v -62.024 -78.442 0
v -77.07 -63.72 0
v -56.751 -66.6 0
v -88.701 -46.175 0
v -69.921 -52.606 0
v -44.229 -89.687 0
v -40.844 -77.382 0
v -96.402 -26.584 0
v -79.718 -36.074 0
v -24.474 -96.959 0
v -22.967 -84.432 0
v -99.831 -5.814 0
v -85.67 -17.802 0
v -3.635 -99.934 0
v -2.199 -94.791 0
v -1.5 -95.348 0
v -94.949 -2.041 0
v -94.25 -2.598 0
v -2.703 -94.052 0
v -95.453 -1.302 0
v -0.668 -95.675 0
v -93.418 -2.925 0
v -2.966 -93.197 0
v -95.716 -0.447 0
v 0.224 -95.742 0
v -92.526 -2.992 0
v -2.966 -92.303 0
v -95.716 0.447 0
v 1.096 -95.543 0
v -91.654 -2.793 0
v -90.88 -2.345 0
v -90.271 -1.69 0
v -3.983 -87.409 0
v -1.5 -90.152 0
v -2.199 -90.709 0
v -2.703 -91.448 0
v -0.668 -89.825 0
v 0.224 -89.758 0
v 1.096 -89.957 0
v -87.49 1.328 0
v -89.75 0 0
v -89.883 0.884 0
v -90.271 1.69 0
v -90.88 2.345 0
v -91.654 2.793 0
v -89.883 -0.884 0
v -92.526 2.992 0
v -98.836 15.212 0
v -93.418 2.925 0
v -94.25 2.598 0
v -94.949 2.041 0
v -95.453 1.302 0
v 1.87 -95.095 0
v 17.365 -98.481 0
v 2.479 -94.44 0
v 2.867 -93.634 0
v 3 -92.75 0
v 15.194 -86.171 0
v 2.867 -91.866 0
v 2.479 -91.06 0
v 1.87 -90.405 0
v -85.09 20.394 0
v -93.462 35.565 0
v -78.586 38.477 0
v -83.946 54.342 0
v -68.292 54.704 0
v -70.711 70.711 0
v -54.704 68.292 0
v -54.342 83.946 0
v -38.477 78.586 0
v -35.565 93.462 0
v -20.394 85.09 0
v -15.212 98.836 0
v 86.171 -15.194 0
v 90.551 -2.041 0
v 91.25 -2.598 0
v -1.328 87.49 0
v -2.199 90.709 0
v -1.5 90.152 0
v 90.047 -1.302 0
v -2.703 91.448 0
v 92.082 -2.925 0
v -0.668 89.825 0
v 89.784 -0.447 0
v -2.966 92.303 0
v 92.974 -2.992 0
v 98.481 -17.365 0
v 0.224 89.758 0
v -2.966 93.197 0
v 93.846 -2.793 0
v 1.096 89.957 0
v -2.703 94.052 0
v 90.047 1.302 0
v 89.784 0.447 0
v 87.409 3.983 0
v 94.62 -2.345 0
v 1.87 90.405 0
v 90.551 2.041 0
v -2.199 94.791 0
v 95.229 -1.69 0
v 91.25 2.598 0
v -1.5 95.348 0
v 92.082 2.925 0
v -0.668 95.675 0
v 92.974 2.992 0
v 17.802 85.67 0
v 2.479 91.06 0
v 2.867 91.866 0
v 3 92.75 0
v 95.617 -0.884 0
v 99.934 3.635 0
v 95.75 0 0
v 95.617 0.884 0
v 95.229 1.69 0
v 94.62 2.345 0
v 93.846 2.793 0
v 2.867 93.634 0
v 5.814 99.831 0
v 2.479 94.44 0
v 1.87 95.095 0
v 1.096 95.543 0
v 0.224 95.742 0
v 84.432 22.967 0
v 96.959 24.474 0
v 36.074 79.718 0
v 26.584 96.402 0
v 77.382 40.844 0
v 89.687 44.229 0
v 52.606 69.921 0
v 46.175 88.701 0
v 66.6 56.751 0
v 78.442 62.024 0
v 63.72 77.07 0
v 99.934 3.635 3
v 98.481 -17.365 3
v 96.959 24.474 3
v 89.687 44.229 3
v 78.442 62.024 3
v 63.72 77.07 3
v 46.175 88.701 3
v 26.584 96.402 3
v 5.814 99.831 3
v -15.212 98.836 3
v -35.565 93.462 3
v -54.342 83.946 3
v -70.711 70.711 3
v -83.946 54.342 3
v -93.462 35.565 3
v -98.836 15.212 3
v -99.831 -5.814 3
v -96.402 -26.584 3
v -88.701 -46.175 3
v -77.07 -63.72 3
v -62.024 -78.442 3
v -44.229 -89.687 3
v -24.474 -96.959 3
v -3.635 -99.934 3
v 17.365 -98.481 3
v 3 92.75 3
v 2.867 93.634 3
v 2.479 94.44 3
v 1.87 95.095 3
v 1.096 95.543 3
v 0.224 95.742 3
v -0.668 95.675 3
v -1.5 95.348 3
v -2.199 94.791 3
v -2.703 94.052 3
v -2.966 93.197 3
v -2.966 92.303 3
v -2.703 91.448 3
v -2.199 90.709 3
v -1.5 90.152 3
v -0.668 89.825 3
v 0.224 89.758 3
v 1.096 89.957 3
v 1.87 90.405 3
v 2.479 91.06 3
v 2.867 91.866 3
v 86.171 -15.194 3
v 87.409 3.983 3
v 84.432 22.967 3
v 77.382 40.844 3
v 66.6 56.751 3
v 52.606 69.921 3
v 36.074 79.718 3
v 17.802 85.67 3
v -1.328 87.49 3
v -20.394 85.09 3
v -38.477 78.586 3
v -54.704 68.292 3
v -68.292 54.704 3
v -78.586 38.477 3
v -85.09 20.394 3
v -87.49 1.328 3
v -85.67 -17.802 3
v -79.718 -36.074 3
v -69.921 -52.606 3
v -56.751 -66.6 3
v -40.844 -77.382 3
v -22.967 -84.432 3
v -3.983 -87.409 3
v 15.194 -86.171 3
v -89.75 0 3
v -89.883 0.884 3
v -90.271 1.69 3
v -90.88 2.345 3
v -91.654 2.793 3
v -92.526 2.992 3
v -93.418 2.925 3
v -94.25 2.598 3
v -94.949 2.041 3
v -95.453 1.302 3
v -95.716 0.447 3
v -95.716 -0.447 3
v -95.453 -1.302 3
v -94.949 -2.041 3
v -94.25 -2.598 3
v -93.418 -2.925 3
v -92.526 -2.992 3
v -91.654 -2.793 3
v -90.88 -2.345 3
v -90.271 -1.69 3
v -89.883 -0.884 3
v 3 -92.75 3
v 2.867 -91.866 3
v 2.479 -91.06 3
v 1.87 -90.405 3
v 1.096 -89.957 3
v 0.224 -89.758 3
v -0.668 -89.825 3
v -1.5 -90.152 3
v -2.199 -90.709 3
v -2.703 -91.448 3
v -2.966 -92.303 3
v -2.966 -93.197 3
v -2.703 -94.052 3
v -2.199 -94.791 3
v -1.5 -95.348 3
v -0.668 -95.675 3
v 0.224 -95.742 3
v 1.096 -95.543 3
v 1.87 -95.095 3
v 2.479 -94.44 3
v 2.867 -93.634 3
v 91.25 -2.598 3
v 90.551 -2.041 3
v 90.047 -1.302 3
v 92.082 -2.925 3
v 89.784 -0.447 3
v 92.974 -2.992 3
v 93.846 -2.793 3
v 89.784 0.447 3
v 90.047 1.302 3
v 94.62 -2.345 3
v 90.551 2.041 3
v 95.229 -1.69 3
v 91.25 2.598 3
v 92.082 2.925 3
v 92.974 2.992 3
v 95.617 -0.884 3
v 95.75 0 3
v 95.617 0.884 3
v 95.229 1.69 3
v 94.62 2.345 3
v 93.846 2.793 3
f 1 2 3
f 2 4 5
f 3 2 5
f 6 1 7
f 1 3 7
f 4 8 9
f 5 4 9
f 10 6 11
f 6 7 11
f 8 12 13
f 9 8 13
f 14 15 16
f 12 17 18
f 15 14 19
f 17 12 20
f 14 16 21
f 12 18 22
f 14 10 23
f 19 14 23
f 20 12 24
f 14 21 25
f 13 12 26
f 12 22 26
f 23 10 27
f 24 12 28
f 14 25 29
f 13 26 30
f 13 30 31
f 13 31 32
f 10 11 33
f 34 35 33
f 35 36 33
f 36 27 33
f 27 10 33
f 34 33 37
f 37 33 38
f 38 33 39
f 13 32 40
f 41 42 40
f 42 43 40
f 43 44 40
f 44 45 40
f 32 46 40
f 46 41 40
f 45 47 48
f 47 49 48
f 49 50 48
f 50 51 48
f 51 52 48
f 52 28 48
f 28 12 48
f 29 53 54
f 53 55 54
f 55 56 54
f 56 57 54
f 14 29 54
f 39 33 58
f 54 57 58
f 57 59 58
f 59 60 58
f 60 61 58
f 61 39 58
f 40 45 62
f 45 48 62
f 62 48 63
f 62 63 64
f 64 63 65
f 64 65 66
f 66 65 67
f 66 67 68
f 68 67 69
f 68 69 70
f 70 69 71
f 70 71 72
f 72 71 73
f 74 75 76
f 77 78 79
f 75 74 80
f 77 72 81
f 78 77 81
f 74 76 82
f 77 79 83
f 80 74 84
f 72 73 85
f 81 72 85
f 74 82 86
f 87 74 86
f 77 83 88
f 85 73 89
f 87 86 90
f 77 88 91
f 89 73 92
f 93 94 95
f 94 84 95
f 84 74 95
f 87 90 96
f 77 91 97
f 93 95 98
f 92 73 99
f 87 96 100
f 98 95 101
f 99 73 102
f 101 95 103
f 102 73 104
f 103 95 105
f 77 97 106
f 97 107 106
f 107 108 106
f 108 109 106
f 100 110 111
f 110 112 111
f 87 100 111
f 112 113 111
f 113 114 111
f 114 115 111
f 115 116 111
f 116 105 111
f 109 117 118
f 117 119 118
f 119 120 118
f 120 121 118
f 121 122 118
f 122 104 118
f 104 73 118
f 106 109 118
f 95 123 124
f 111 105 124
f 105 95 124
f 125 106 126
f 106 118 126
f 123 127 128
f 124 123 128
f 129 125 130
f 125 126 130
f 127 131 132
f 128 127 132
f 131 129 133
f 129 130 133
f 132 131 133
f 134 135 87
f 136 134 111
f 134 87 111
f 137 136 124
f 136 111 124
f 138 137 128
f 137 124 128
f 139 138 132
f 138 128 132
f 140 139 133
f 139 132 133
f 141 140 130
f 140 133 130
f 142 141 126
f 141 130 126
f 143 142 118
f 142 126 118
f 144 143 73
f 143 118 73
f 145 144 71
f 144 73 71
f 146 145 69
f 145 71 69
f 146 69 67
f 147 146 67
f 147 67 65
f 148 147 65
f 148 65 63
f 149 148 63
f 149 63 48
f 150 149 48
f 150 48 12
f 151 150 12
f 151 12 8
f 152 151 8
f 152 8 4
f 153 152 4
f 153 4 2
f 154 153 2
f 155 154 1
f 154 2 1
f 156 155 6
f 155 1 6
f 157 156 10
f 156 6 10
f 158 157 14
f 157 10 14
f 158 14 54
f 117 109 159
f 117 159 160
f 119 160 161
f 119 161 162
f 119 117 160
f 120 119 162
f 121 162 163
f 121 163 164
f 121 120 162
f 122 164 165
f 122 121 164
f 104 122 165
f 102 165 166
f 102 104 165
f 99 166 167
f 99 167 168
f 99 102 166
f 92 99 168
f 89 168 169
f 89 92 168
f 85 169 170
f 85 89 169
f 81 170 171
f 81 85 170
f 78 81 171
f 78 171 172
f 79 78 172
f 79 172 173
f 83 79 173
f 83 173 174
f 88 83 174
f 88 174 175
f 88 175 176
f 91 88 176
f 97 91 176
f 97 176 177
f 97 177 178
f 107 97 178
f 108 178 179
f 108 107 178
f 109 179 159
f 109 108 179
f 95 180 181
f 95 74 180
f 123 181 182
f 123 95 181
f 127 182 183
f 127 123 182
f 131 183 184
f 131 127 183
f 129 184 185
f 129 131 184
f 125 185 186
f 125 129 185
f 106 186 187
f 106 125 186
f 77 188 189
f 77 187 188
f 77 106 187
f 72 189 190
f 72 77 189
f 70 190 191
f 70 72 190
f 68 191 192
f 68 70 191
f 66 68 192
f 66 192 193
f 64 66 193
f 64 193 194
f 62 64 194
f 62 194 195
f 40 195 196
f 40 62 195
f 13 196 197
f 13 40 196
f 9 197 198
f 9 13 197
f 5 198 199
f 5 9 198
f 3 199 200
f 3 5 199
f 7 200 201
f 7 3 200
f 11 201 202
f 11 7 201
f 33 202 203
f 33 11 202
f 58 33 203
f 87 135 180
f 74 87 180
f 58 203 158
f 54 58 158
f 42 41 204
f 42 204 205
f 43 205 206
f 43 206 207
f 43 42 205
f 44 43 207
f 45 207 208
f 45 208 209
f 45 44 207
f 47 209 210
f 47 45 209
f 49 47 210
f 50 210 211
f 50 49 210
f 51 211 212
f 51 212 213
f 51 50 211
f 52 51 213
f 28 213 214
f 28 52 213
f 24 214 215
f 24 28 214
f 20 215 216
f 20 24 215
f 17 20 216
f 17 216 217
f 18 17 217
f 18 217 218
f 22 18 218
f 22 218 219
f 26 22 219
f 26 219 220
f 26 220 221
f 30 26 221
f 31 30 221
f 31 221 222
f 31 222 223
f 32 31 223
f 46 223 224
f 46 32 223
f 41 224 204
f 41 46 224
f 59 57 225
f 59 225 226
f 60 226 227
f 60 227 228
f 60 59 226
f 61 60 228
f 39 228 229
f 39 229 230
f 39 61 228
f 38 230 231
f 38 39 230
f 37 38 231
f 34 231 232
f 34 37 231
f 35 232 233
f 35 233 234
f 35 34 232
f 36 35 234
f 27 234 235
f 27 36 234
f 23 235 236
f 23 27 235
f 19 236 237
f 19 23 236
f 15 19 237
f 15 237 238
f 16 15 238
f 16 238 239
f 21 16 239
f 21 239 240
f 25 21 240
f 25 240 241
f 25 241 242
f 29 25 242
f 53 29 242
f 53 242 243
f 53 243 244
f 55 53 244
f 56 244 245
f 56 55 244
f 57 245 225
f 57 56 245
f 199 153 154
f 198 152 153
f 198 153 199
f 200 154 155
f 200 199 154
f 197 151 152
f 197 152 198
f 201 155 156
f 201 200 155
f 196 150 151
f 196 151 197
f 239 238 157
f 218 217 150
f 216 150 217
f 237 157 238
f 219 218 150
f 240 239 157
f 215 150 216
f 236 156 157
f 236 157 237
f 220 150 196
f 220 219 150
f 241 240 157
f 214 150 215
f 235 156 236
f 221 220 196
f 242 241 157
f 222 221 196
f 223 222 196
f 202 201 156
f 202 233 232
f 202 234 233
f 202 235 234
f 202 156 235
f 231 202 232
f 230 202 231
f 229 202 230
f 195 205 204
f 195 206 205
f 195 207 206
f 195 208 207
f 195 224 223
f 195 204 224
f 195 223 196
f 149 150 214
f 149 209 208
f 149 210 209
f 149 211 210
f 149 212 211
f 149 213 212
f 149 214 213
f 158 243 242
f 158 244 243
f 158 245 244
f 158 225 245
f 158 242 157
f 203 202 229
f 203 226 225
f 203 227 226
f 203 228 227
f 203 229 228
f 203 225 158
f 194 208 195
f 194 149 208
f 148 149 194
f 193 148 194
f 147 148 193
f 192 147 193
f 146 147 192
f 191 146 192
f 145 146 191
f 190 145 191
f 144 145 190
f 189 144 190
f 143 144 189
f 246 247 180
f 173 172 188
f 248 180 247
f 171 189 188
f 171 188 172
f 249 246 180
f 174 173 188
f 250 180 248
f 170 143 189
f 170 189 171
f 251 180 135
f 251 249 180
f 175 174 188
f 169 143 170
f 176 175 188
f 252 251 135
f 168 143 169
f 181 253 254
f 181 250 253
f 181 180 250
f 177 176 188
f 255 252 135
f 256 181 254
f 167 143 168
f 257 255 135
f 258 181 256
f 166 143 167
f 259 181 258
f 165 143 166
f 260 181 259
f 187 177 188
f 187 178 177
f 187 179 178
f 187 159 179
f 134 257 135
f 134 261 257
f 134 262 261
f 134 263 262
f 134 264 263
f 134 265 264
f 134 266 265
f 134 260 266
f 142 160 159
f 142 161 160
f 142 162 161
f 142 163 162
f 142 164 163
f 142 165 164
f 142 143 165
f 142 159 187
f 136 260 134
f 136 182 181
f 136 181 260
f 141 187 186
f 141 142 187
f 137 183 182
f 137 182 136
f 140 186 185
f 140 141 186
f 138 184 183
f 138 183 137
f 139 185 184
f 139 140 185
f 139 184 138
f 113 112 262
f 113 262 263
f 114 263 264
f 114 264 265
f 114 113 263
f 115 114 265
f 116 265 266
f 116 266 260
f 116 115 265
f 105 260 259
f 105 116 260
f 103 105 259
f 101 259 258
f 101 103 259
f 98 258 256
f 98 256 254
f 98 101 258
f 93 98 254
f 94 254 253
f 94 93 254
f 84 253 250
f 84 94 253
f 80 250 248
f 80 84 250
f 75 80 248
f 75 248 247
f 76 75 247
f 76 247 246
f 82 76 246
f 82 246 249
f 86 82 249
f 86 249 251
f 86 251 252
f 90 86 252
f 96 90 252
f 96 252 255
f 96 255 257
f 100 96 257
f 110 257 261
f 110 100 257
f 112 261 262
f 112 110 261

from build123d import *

# Parameters (mm, degrees)
SKETCH_1_R          = 100
SKETCH_1_R_2        = 87.5
SKETCH_1_R_3        = 3
EXTRUDE_1_DEPTH     = 3
CUT_EXTRUDE_1_DEPTH = 142.453172464


with BuildPart() as part:
    # 草图1 → 凸台-拉伸1 (new body)
    with BuildSketch(Plane.XY):
        Circle(SKETCH_1_R)
        Circle(SKETCH_1_R_2, mode=Mode.SUBTRACT)
        with Locations((0, 92.75)):
            Circle(SKETCH_1_R_3, mode=Mode.SUBTRACT)
        with Locations((92.75, 0)):
            Circle(SKETCH_1_R_3, mode=Mode.SUBTRACT)
        with Locations((0, -92.75)):
            Circle(SKETCH_1_R_3, mode=Mode.SUBTRACT)
        with Locations((-92.75, 0)):
            Circle(SKETCH_1_R_3, mode=Mode.SUBTRACT)
    extrude(amount=EXTRUDE_1_DEPTH)

    # 草图2 → 切除-拉伸1 (cut, through all)
    with BuildSketch(Plane.XY.offset(3)):
        with BuildLine():
            ThreePointArc((86.170678389, -15.194215546), (61.871843354, -61.871843354), (15.194215546, -86.170678389))
            Line((15.194215546, -86.170678389), (17.364817767, -98.480775301))
            ThreePointArc((17.364817767, -98.480775301), (70.710678119, -70.710678119), (98.480775301, -17.364817767))
            Line((98.480775301, -17.364817767), (86.170678389, -15.194215546))
        make_face()
    extrude(amount=-CUT_EXTRUDE_1_DEPTH, mode=Mode.SUBTRACT)


solid = part.part
